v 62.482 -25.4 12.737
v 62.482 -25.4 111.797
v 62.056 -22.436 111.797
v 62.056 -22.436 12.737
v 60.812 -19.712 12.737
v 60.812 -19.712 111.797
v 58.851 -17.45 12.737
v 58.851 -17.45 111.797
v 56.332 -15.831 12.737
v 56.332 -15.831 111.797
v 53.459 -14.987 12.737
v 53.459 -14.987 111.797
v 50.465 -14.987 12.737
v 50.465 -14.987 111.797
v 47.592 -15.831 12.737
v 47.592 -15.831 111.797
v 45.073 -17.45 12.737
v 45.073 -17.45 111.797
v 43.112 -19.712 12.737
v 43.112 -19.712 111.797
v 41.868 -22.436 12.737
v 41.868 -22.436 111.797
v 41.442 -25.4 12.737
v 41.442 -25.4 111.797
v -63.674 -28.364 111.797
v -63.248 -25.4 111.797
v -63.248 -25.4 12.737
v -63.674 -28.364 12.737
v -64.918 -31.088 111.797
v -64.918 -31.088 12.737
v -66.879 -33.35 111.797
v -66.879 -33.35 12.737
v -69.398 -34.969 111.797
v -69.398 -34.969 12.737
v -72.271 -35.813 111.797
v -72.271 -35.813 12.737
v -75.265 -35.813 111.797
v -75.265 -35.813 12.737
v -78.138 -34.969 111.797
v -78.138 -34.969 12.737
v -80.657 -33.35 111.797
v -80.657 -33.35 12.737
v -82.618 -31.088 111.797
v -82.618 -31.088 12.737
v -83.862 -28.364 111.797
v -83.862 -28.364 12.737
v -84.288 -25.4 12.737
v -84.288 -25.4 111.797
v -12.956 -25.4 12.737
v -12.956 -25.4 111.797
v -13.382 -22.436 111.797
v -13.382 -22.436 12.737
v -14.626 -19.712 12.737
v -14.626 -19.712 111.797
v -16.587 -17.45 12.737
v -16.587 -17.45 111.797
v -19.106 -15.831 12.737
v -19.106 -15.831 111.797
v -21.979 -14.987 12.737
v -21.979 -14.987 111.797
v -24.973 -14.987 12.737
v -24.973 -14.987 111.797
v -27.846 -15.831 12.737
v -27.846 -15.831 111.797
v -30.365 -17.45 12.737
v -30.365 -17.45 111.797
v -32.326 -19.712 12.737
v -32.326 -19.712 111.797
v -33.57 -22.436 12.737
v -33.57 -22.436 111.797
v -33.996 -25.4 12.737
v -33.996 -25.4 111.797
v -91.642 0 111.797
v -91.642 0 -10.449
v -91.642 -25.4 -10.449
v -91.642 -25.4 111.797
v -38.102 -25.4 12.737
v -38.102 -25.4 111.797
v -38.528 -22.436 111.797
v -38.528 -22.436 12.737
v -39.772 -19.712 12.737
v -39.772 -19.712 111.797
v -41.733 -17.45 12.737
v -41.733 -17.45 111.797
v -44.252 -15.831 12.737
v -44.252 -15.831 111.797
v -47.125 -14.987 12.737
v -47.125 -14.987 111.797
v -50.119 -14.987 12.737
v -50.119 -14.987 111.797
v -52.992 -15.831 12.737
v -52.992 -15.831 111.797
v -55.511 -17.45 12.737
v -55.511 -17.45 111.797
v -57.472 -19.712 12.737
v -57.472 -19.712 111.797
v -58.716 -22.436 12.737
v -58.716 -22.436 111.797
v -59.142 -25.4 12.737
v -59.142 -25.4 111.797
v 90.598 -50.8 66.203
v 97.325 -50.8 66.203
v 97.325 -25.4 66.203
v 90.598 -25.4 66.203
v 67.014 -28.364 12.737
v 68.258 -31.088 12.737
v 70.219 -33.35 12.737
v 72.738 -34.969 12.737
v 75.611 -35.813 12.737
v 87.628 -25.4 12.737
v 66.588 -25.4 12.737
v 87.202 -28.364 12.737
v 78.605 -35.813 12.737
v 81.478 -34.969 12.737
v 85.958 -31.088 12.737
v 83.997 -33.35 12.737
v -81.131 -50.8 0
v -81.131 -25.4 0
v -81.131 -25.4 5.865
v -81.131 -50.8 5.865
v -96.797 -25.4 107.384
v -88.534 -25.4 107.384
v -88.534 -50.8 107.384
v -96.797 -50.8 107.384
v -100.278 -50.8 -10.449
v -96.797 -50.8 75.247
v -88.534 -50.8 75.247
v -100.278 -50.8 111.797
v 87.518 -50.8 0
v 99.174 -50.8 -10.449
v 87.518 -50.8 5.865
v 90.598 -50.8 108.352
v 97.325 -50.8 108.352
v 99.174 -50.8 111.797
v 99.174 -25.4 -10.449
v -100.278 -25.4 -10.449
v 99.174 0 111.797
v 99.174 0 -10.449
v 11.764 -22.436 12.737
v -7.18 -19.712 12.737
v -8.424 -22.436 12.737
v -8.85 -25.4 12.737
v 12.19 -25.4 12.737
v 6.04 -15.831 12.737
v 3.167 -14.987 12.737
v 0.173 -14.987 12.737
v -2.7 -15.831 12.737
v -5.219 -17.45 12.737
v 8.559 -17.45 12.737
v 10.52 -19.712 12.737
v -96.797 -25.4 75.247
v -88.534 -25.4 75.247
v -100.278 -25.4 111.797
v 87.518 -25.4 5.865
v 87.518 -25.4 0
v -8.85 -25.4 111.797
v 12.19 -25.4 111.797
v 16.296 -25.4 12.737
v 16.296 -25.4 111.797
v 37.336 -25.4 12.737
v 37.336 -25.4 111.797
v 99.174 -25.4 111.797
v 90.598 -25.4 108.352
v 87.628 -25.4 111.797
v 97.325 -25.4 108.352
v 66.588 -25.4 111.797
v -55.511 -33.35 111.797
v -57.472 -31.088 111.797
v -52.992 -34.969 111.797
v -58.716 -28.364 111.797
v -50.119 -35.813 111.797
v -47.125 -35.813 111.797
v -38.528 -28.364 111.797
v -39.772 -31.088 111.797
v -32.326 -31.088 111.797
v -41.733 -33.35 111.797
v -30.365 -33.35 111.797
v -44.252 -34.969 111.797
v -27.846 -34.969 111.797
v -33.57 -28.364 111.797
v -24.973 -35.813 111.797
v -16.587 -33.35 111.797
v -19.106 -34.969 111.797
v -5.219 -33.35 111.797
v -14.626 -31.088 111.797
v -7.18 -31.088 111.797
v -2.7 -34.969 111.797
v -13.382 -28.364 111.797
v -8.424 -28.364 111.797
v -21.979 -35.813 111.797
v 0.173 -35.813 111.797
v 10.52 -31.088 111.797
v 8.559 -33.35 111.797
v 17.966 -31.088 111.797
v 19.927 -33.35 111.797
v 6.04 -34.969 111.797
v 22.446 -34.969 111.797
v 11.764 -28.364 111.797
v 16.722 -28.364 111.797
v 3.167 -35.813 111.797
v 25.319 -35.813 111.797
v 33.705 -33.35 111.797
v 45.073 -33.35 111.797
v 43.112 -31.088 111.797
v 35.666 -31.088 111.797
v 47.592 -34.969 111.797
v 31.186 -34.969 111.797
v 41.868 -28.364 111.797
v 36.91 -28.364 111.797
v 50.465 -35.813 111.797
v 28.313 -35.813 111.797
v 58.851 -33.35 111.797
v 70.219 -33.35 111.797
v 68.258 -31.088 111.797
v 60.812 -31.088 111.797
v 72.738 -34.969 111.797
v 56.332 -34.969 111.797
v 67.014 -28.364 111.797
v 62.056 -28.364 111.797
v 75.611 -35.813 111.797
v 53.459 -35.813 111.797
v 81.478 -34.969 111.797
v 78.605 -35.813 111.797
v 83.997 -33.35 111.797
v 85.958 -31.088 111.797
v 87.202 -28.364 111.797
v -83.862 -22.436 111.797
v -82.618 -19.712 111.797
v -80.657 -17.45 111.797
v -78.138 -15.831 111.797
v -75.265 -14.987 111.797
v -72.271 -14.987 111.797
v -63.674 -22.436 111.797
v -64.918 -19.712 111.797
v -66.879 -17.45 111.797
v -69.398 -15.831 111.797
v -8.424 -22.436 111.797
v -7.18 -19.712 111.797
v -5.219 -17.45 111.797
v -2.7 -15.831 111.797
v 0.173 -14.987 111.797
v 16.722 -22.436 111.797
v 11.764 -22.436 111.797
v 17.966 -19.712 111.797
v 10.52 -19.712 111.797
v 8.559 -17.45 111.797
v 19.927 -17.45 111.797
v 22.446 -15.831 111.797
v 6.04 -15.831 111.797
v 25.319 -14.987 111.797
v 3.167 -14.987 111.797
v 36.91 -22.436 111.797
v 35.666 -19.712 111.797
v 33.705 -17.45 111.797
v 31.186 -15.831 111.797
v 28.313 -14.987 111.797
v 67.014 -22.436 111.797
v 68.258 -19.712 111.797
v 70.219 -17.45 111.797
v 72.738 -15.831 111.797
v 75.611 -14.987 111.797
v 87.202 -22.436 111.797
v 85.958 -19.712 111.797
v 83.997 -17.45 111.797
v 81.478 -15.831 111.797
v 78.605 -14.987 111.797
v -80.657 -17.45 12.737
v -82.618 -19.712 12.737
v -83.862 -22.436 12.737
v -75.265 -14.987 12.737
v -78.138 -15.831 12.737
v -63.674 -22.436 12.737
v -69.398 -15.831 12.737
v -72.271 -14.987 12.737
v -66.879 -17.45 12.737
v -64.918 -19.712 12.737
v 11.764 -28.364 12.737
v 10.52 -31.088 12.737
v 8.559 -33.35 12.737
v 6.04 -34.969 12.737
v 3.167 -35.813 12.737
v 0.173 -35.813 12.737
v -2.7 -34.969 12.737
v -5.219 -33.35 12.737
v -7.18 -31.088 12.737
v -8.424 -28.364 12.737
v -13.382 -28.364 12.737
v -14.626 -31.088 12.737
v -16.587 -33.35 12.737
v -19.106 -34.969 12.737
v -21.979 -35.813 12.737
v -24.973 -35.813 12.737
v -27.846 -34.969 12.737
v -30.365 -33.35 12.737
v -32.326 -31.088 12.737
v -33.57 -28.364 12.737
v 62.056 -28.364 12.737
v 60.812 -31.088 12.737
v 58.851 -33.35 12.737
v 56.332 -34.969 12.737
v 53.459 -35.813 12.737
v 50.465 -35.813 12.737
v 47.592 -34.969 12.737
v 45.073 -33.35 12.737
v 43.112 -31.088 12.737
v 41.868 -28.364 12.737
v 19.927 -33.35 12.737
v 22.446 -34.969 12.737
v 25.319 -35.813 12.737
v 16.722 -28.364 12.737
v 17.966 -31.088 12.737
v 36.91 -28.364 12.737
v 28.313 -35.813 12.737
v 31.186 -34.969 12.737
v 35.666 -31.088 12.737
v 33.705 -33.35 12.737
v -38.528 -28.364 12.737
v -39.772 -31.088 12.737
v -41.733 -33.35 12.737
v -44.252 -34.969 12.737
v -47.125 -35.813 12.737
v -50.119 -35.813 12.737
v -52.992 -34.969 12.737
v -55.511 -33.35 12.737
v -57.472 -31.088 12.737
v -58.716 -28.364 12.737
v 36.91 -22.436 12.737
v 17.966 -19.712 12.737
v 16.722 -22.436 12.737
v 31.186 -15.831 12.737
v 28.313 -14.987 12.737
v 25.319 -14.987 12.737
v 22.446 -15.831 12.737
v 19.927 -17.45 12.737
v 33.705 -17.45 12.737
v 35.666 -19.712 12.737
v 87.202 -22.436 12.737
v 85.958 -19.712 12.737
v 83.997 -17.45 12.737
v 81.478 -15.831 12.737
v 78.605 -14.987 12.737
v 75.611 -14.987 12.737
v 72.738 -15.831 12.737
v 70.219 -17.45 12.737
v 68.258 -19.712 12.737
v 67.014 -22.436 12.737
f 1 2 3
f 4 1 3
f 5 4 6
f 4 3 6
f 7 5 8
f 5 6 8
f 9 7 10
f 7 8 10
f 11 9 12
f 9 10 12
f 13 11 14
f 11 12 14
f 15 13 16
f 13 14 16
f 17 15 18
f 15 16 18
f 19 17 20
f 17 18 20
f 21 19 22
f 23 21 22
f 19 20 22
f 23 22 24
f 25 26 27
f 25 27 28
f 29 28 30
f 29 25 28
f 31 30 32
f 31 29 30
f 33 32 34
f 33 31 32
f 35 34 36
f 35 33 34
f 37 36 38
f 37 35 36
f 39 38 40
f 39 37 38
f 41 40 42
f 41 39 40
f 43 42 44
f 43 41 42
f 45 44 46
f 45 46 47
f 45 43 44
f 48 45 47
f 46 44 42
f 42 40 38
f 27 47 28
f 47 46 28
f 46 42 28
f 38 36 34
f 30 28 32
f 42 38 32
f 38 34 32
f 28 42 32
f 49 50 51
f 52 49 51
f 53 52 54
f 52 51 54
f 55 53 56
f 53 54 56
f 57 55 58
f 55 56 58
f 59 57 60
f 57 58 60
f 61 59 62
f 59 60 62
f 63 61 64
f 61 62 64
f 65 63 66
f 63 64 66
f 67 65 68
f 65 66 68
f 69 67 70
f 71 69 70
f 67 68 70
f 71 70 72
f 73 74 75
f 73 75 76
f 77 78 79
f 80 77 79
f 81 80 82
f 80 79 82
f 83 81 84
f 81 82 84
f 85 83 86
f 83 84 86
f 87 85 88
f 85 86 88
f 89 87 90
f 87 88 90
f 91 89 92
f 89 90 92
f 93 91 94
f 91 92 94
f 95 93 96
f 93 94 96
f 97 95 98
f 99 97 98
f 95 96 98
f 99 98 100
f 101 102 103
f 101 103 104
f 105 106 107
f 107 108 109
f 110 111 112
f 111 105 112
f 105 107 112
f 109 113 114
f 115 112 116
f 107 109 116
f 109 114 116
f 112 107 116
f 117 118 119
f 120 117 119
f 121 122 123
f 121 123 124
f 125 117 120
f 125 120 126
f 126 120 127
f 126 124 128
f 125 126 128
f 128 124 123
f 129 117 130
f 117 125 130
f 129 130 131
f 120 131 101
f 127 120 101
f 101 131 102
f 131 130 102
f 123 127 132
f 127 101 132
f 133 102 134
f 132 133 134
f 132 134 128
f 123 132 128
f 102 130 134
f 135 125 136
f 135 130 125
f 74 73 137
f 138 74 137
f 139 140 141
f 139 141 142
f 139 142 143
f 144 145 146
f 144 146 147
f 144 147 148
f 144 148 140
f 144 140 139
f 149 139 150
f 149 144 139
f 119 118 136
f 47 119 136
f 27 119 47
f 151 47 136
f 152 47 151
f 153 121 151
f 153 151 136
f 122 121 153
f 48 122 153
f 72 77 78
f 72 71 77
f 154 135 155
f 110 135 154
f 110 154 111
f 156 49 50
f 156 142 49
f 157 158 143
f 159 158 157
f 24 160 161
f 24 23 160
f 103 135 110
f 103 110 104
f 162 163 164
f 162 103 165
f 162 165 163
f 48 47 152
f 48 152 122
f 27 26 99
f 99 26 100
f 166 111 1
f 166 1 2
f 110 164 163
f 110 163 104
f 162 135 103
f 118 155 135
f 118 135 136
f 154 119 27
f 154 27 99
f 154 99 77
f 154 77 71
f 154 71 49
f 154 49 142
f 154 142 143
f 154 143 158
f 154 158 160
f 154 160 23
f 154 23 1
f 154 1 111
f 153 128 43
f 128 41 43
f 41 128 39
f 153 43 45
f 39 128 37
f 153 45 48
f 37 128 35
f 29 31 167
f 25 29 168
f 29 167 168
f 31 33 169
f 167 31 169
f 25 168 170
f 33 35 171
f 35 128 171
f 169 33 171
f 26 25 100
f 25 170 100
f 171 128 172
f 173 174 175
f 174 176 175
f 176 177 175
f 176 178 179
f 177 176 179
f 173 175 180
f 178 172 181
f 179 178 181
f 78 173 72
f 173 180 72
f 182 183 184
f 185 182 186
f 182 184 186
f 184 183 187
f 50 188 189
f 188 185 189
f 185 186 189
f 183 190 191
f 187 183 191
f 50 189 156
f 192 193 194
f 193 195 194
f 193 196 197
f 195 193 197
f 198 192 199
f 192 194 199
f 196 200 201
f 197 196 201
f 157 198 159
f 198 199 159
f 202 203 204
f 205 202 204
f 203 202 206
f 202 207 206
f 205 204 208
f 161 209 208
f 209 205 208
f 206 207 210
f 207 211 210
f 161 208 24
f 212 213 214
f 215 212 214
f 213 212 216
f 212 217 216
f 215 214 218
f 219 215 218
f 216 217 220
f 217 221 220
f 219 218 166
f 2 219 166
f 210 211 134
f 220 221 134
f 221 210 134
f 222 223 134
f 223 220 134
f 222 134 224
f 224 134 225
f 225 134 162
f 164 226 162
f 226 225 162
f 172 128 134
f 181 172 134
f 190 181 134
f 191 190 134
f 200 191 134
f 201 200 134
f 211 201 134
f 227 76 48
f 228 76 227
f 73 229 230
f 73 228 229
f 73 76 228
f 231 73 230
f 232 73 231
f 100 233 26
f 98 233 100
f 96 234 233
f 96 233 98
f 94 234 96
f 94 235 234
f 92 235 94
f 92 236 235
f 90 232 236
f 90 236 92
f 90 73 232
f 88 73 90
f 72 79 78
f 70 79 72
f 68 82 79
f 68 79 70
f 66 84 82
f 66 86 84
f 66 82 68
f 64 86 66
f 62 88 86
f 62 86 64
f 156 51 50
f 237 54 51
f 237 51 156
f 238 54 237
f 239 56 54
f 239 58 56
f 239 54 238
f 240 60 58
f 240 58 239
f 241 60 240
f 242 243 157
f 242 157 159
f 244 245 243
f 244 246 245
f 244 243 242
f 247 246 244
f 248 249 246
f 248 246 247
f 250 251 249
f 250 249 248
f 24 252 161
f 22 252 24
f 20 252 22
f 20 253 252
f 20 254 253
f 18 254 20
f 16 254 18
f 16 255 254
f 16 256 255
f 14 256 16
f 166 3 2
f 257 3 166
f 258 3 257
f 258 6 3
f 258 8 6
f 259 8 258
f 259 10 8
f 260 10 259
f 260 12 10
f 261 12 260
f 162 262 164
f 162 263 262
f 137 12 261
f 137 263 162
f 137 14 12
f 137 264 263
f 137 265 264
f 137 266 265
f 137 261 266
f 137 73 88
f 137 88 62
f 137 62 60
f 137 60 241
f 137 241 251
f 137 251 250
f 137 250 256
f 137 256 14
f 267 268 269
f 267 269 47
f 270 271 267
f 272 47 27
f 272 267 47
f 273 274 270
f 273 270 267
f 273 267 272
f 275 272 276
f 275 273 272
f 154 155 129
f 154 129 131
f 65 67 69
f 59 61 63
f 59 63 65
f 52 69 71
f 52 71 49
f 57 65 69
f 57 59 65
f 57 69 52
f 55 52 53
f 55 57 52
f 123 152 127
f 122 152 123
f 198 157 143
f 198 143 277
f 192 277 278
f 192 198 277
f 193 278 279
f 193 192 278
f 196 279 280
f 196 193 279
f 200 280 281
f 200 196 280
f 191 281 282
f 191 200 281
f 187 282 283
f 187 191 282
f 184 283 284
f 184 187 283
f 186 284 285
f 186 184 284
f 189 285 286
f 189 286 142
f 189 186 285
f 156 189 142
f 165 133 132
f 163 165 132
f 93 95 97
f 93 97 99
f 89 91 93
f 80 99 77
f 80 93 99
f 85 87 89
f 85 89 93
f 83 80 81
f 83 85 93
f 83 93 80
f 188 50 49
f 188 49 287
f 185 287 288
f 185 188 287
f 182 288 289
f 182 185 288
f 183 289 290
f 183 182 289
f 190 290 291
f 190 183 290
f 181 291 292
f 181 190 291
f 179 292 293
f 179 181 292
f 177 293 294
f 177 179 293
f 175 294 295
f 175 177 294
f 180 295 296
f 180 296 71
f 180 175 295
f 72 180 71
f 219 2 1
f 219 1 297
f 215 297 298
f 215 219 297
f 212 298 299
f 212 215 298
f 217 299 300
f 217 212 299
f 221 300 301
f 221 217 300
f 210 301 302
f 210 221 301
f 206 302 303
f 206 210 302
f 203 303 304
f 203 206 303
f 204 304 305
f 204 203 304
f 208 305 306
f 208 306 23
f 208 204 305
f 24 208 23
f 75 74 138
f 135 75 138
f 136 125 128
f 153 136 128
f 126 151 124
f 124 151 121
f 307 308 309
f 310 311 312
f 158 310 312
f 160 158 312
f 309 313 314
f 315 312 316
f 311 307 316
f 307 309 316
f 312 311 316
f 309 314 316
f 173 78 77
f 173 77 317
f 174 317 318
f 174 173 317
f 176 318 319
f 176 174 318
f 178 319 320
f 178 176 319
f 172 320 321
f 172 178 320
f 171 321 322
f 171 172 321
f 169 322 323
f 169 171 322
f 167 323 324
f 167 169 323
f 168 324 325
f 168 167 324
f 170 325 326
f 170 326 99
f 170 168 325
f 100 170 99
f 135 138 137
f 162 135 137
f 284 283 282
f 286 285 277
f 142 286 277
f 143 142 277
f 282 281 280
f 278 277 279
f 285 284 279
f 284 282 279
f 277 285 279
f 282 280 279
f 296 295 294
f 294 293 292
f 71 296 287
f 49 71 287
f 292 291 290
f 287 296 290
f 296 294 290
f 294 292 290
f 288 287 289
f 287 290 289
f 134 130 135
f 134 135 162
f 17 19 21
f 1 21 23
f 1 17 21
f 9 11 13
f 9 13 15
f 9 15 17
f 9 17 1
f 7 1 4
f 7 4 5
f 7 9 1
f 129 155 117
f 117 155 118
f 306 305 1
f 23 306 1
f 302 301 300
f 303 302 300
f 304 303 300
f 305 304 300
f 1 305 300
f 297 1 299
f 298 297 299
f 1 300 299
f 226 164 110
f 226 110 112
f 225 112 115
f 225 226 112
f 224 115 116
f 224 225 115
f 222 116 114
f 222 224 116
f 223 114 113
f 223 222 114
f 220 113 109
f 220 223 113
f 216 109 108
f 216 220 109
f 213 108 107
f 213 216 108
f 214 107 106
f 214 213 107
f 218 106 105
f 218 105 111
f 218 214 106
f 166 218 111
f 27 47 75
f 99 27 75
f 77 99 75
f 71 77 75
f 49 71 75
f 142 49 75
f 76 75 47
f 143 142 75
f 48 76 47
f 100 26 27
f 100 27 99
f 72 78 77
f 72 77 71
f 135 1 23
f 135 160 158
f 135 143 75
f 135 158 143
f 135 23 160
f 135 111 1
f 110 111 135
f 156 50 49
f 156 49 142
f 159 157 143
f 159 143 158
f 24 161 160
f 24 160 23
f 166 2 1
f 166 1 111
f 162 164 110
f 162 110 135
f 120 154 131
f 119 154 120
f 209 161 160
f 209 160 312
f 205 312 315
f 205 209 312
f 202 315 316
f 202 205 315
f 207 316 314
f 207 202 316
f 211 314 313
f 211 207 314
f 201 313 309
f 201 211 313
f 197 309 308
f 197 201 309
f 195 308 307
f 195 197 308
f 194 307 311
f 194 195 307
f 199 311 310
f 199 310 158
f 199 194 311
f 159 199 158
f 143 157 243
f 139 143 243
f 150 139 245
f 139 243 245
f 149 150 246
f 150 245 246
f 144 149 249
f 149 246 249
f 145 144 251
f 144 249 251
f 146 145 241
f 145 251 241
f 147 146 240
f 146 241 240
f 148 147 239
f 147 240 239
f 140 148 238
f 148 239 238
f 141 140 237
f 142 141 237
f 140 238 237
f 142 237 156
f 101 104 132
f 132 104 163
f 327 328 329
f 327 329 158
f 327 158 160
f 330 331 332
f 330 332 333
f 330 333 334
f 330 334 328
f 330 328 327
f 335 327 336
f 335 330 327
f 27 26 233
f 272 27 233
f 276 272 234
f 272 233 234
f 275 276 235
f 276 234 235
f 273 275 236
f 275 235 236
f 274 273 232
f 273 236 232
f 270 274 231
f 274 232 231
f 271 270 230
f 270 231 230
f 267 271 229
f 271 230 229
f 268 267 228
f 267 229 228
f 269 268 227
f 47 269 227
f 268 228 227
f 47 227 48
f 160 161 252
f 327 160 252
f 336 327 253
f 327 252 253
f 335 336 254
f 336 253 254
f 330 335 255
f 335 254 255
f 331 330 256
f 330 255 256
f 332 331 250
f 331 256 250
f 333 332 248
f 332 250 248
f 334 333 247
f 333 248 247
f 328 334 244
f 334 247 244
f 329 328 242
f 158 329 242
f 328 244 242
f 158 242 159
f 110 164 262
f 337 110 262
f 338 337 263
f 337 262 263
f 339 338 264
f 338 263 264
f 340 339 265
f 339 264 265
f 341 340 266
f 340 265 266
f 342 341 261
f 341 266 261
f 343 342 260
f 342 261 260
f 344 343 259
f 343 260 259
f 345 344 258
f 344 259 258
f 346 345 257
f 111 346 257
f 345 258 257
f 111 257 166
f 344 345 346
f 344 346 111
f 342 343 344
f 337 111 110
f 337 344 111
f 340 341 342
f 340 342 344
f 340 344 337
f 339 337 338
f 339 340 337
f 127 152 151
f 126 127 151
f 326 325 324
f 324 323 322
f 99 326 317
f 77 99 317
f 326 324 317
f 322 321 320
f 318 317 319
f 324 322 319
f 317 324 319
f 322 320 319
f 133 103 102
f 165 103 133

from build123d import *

# Parameters (mm, degrees)
F0_W      = 190.8158659935
F0_H      = 122.2459543496
F1_DEPTH  = 25.4
F3_DEPTH  = 99.06
F6_W      = 168.649494648
F6_H      = 5.8652460575
F7_DEPTH  = 25.4
F8_DEPTH  = 8.636
F9_W      = 6.7271590233
F9_H      = 42.1485826373
F9_W_2    = 8.2633495331
F9_H_2    = 32.1369692683
F10_DEPTH = 25.4


with BuildPart() as f1:
    # F0 (on Front) → F1 (new body)
    with BuildSketch(Plane.XZ):
        with Locations((3.766104579, 50.6741991267)):
            Rectangle(F0_W, F0_H)
    extrude(amount=F1_DEPTH)

    # F2 (on face) → F3 (cut)
    with BuildSketch(Plane.XY.offset(111.7971763015)):
        with BuildLine():
            Line((-84.2879353085, -25.4), (-63.2479401312, -25.4))
            ThreePointArc((-63.2479401312, -25.4), (-73.7679377198, -14.8800024114), (-84.2879353085, -25.4))
        make_face()
        with BuildLine():
            ThreePointArc((-38.1019401312, -25.4), (-48.6219377198, -14.8800024114), (-59.1419353085, -25.4))
            Line((-59.1419353085, -25.4), (-38.1019401312, -25.4))
        make_face()
        with BuildLine():
            ThreePointArc((-12.9559401312, -25.4), (-23.4759377198, -14.8800024114), (-33.9959353085, -25.4))
            Line((-33.9959353085, -25.4), (-12.9559401312, -25.4))
        make_face()
        with BuildLine():
            ThreePointArc((12.1900598688, -25.4), (1.6700622802, -14.8800024114), (-8.8499353085, -25.4))
            Line((-8.8499353085, -25.4), (12.1900598688, -25.4))
        make_face()
        with BuildLine():
            ThreePointArc((37.3360598688, -25.4), (26.8160622802, -14.8800024114), (16.2960646915, -25.4))
            Line((16.2960646915, -25.4), (37.3360598688, -25.4))
        make_face()
        with BuildLine():
            Line((66.5880646915, -25.4), (87.6280598688, -25.4))
            ThreePointArc((87.6280598688, -25.4), (77.1080622802, -14.8800024114), (66.5880646915, -25.4))
        make_face()
        with BuildLine():
            Line((41.4420646915, -25.4), (62.4820598688, -25.4))
            ThreePointArc((62.4820598688, -25.4), (51.9620622802, -14.8800024114), (41.4420646915, -25.4))
        make_face()
    extrude(amount=-F3_DEPTH, mode=Mode.SUBTRACT)


with BuildPart() as f5_1:
    # F5: instance of F1
    add(f1.part.mirror(Plane.XZ.offset(25.4)))

    # F6 (on face) → F7 (cut)
    with BuildSketch(Plane(origin=(0, -25.4, 0), x_dir=(-1, 0, 0), z_dir=(0, 1, 0))):
        with Locations((-3.1935498118, 2.9326230288)):
            Rectangle(F6_W, F6_H)
    extrude(amount=-F7_DEPTH, mode=Mode.SUBTRACT)

    # F8 (add): a face of the model
    f8_faces = [f5_1.faces().sort_by_distance(p)[0] for p in [
        (-91.6418284178, -38.1, 50.6741991267),
    ]]
    extrude(f8_faces, amount=F8_DEPTH)

    # F9 (on face) → F10 (cut)
    with BuildSketch(Plane(origin=(0, -25.4, 0), x_dir=(-1, 0, 0), z_dir=(0, 1, 0))):
        with Locations((-93.961365521, 87.2773639858)):
            Rectangle(F9_W, F9_H)
        with Locations((92.6653891802, 91.3156010211)):
            Rectangle(F9_W_2, F9_H_2)
    extrude(amount=-F10_DEPTH, mode=Mode.SUBTRACT)


solid = Compound([f1.part, f5_1.part])
